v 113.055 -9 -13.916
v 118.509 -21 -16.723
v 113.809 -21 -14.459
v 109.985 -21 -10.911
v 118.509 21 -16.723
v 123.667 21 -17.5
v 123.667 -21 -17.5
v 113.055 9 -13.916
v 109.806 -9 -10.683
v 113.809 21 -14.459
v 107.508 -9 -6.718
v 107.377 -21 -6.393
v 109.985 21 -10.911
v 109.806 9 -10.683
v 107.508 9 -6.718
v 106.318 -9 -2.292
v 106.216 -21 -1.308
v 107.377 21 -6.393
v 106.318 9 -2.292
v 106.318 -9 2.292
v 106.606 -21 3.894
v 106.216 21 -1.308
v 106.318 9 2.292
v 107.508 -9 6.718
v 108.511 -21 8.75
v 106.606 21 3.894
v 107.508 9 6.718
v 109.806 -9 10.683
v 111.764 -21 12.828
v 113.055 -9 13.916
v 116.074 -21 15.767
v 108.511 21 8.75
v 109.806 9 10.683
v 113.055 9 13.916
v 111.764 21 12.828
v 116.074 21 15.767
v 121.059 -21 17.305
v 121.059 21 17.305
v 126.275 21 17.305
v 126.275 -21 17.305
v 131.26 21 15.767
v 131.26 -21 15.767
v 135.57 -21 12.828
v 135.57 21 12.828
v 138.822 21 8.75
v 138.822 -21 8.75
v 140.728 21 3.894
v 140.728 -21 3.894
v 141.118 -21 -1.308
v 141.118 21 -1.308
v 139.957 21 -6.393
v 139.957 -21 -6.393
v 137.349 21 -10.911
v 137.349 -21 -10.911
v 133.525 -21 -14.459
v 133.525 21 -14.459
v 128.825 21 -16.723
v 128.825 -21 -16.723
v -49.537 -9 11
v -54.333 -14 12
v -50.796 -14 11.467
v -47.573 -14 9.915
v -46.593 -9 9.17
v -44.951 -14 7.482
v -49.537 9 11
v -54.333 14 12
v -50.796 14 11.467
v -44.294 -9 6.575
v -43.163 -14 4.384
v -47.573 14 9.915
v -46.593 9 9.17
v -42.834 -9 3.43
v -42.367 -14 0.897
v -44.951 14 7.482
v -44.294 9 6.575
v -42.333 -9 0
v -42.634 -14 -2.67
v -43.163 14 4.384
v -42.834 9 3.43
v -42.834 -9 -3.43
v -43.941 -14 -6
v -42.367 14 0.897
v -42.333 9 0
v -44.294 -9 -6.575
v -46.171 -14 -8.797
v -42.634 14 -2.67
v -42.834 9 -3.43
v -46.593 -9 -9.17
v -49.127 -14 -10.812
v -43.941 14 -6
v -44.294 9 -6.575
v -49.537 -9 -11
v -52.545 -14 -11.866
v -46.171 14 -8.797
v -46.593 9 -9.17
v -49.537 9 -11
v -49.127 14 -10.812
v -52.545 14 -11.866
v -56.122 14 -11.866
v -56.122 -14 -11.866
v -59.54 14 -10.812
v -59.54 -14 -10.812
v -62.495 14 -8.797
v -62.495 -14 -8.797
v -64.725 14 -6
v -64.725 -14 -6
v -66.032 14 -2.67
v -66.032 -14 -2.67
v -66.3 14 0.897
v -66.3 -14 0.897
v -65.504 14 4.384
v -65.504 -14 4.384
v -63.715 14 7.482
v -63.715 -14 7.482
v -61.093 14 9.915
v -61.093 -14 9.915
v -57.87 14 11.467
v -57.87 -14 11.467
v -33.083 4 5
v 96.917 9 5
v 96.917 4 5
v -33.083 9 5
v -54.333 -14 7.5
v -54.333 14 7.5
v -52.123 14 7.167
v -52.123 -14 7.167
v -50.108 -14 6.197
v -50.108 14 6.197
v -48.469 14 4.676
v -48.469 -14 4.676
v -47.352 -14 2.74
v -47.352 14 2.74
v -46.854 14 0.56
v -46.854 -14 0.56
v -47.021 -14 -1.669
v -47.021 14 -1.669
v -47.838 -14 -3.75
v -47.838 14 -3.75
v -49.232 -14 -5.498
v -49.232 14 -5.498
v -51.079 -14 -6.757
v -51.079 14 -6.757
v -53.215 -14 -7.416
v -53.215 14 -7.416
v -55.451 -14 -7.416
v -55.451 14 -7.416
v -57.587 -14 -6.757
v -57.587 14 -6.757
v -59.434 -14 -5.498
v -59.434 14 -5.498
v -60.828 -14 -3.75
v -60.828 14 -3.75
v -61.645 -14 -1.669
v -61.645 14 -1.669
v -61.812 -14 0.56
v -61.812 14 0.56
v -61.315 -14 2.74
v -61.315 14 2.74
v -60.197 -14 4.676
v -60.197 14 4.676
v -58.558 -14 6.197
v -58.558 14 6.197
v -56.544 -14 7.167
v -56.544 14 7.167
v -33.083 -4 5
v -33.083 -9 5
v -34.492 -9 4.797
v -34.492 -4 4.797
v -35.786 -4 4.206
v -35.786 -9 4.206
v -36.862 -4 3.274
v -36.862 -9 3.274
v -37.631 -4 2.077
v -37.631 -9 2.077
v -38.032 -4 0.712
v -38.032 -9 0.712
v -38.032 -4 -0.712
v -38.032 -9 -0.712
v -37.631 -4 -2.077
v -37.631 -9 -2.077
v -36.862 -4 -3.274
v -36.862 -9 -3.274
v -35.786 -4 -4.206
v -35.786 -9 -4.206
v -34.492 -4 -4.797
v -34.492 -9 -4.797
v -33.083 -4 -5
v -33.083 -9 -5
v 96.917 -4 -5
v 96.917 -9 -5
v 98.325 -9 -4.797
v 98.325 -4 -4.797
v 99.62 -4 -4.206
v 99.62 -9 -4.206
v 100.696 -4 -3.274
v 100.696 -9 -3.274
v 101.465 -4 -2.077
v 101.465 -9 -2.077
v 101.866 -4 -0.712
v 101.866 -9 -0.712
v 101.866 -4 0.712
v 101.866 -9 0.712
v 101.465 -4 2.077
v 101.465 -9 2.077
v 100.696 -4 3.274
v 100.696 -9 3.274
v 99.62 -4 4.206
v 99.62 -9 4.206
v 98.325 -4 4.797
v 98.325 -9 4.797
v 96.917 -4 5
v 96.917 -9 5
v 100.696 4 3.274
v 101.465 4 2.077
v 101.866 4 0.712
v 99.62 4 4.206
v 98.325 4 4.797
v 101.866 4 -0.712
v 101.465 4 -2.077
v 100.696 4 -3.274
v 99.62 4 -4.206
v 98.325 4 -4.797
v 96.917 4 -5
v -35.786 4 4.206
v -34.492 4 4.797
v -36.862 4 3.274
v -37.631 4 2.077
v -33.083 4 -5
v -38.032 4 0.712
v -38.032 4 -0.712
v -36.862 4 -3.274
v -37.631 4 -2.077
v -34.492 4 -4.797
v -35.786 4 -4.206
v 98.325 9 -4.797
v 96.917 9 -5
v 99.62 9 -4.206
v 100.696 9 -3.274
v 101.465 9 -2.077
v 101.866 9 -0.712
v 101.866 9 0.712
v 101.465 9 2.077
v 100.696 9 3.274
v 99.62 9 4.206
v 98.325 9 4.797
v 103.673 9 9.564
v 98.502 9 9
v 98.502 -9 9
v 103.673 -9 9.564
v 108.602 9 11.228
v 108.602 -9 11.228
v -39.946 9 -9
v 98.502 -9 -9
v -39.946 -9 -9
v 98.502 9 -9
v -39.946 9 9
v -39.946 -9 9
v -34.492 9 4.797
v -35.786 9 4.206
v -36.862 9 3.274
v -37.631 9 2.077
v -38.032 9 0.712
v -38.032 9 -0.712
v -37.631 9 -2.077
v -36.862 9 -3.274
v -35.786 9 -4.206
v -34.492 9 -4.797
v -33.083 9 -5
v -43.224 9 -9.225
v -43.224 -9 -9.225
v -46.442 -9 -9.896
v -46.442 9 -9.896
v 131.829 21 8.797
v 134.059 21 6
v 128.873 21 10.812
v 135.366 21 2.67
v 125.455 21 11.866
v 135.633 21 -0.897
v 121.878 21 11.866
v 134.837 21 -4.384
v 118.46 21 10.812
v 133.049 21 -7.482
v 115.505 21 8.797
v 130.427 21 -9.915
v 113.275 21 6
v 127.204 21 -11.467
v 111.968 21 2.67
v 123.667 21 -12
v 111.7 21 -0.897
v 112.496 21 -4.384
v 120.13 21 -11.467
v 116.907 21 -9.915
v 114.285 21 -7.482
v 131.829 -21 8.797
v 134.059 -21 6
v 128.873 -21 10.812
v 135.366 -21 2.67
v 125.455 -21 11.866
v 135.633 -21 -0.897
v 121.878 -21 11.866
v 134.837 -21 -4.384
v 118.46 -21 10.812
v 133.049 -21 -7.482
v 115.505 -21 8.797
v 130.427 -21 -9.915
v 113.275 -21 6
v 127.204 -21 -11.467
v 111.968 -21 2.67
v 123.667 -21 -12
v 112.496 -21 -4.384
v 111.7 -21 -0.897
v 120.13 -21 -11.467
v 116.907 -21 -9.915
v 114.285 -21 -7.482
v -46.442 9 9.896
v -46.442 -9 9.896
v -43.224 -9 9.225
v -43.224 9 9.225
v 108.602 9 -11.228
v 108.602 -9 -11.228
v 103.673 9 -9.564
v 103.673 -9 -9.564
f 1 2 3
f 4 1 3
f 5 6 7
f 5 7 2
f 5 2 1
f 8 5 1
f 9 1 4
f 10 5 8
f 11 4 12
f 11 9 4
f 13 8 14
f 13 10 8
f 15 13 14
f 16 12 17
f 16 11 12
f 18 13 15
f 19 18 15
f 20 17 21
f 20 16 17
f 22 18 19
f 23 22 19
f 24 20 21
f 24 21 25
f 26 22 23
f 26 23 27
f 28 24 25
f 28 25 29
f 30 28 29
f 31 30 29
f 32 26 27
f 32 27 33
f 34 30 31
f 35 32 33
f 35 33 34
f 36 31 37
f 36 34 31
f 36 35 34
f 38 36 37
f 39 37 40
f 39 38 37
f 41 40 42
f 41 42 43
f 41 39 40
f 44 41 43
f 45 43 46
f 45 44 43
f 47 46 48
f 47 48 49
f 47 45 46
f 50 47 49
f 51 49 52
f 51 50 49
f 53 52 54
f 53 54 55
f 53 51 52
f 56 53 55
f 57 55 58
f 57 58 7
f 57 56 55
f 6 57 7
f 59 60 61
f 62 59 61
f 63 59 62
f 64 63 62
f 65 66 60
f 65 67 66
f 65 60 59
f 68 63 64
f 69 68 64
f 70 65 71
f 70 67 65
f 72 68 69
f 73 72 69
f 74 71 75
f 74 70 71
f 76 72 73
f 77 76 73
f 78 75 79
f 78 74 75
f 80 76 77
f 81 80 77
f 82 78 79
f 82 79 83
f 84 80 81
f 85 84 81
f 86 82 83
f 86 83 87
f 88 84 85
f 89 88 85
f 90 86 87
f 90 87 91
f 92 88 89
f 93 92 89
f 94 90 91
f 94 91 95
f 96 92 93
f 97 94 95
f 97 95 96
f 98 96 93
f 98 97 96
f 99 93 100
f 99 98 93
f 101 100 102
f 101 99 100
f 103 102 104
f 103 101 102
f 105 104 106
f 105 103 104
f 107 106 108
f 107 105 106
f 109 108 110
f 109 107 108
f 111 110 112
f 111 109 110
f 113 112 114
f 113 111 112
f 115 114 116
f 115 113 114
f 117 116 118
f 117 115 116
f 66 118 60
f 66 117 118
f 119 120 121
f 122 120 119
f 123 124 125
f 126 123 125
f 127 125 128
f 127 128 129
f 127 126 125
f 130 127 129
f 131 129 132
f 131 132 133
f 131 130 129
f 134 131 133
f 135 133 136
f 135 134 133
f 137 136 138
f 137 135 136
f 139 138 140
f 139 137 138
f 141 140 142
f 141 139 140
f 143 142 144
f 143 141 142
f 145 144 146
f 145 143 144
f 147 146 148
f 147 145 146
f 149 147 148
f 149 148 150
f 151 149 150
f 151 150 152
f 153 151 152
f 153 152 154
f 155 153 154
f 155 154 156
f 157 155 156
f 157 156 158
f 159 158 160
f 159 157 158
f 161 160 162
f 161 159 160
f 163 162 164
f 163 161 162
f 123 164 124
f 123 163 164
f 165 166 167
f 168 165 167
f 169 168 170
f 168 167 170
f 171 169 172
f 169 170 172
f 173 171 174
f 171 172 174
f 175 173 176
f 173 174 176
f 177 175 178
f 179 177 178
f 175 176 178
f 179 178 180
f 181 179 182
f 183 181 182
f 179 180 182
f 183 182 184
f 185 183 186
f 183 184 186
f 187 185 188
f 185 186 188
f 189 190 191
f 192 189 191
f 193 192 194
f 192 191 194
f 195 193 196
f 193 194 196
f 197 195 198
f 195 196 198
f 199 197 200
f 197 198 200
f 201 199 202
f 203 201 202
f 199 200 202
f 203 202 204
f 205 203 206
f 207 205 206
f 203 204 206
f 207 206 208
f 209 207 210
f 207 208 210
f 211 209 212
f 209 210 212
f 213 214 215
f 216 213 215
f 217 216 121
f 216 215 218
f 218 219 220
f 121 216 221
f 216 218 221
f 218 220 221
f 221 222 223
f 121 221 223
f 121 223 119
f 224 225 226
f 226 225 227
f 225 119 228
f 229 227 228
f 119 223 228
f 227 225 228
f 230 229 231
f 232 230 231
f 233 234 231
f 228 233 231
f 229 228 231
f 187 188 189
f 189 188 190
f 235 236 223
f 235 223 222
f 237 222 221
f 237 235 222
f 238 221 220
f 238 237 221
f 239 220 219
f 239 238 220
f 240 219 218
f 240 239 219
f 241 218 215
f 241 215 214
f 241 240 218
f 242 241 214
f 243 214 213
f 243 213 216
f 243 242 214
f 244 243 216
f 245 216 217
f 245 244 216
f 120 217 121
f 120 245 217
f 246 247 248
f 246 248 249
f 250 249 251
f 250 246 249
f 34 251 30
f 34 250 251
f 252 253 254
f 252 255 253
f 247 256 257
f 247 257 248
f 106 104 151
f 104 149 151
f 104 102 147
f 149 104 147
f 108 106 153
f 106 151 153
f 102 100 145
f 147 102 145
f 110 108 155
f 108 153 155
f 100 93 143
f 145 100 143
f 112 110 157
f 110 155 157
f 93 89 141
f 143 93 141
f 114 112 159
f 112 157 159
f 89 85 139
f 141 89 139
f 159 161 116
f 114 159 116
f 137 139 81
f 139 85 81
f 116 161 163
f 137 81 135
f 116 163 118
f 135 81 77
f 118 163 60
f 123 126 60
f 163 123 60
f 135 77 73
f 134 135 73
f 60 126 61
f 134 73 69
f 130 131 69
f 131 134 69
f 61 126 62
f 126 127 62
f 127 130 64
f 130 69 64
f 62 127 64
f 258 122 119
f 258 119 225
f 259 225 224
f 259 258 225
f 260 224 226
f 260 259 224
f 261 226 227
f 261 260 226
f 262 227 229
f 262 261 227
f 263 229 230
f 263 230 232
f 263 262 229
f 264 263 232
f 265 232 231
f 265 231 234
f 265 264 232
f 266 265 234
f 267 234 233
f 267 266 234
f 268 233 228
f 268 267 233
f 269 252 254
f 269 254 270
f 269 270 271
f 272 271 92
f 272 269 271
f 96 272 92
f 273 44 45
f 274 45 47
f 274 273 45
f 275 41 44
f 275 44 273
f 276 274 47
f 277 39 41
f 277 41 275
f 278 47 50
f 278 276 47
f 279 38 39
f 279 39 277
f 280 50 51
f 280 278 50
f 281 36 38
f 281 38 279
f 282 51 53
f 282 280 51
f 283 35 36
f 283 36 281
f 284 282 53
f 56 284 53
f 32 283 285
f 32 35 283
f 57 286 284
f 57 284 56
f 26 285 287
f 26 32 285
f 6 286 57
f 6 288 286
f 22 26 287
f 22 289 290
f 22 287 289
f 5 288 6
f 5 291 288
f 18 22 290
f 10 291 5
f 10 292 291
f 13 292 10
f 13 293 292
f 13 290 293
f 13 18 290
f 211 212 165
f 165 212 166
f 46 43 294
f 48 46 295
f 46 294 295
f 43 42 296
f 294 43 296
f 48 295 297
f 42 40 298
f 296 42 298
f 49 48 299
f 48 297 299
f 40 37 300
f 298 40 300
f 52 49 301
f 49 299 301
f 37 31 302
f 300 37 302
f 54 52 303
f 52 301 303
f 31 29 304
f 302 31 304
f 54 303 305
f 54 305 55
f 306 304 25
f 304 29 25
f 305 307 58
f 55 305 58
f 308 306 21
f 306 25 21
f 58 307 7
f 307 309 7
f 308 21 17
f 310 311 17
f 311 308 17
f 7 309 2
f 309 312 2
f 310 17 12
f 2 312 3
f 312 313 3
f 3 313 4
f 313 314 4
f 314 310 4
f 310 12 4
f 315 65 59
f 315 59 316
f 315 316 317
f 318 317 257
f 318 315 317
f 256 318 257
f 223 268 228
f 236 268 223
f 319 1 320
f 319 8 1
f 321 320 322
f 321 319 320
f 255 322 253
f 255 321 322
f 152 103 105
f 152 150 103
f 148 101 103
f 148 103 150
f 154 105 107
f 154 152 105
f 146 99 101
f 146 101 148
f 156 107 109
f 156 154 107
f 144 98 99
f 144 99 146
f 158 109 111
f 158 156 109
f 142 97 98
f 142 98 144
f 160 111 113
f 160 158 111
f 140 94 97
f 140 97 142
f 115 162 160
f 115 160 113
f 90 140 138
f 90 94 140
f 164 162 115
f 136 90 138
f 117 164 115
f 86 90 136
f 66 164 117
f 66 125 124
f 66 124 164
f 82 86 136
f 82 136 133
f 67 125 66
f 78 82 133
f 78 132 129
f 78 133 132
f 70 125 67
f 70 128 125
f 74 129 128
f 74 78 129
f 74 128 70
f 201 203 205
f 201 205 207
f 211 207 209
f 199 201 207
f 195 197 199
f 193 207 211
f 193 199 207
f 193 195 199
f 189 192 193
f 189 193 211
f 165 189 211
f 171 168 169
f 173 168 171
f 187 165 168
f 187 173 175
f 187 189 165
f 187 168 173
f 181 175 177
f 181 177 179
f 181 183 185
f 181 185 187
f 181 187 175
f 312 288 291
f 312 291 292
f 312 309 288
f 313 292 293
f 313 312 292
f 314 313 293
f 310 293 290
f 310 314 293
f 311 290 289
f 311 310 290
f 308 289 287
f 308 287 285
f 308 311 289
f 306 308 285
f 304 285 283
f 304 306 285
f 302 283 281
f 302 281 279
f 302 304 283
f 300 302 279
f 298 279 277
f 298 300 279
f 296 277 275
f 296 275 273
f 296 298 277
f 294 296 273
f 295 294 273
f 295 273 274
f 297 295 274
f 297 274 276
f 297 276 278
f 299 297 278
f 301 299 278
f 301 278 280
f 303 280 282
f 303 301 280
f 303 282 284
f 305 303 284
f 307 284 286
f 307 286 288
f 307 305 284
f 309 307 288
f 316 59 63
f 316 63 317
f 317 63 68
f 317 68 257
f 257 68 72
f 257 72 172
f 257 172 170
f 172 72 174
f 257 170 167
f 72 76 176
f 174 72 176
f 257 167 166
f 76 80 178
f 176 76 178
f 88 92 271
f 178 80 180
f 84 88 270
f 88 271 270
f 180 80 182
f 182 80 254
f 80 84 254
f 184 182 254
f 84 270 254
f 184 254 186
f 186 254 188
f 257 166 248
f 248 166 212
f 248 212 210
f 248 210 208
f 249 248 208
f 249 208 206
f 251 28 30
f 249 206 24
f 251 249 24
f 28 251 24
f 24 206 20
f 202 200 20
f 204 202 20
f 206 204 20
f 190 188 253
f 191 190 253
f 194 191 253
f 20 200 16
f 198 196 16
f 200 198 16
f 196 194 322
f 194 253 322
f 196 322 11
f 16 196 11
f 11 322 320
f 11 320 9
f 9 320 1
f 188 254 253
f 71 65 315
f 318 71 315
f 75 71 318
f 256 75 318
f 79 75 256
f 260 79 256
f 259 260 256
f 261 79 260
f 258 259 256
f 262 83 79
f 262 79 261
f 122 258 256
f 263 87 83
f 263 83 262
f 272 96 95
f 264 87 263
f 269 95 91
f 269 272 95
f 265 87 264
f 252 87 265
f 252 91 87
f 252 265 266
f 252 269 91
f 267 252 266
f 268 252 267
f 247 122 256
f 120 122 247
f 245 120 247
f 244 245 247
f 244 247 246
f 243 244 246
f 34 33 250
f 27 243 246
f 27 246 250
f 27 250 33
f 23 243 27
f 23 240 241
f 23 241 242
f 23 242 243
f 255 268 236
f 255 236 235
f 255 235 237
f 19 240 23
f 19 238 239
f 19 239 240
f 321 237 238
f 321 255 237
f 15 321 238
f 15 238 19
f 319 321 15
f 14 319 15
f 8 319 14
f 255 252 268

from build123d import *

# Parameters (mm, degrees)
SKETCH1_R           = 7.5
BOSS_EXTRUDE1_DEPTH = 14
SKETCH1_3_R         = 12
BOSS_EXTRUDE2_DEPTH = 21
BOSS_EXTRUDE3_DEPTH = 9
CUT_EXTRUDE1_START  = 9
CUT_EXTRUDE1_DEPTH  = 5


with BuildPart() as part:
    # Sketch1 → Boss-Extrude1 (new, symmetric)
    with BuildSketch(Plane(origin=(0, 0, 0), x_dir=(1, 0, 0), z_dir=(0, 1, 0))):
        with BuildLine():
            ThreePointArc((-42.333170882, 0), (-44.294496212, 6.574573055), (-49.537339359, 11))
            ThreePointArc((-49.537339359, 11), (-66.333170882, 0), (-49.537339359, -11))
            ThreePointArc((-49.537339359, -11), (-44.294496212, -6.574573055), (-42.333170882, 0))
        make_face()
        with Locations((-54.333170882, 0)):
            Circle(SKETCH1_R, mode=Mode.SUBTRACT)
    extrude(amount=BOSS_EXTRUDE1_DEPTH, both=True)



with BuildPart() as body_2:
    # Sketch1<3> → Boss-Extrude2 (new, symmetric)
    with BuildSketch(Plane(origin=(0, 0, 0), x_dir=(1, 0, 0), z_dir=(0, 1, 0))):
        with BuildLine():
            ThreePointArc((141.166829118, 0), (131.430475798, 15.683615343), (113.055310235, 13.915662651))
            ThreePointArc((113.055310235, 13.915662651), (106.166829118, 0), (113.055310235, -13.915662651))
            ThreePointArc((113.055310235, -13.915662651), (131.430475798, -15.683615343), (141.166829118, 0))
        make_face()
        with Locations((123.666829118, 0)):
            Circle(SKETCH1_3_R, mode=Mode.SUBTRACT)
    extrude(amount=BOSS_EXTRUDE2_DEPTH, both=True)


with BuildPart() as part_1:
    add(part.part)

    add(body_2.part)  # Boss-Extrude3 merges body 2
    # Sketch1<4> → Boss-Extrude3 (add, symmetric)
    with BuildSketch(Plane(origin=(0, 0, 0), x_dir=(1, 0, 0), z_dir=(0, 1, 0))):
        with BuildLine():
            Line((98.502370054, 9), (-39.945676312, 9))
            ThreePointArc((-39.945676312, 9), (-44.844655798, 9.505319751), (-49.537339359, 11))
            ThreePointArc((-49.537339359, 11), (-42.333170882, 0), (-49.537339359, -11))
            ThreePointArc((-49.537339359, -11), (-44.844655798, -9.505319751), (-39.945676312, -9))
            Line((-39.945676312, -9), (98.502370054, -9))
            ThreePointArc((98.502370054, -9), (106.182731491, -10.26210106), (113.055310235, -13.915662651))
            ThreePointArc((113.055310235, -13.915662651), (106.166829118, 0), (113.055310235, 13.915662651))
            ThreePointArc((113.055310235, 13.915662651), (106.182731491, 10.26210106), (98.502370054, 9))
        make_face()
    extrude(amount=BOSS_EXTRUDE3_DEPTH, both=True)

    # Sketch1<5> → Cut-Extrude1 (cut)
    with BuildSketch(Plane(origin=(0, 0, 0), x_dir=(1, 0, 0), z_dir=(0, 1, 0)).offset(CUT_EXTRUDE1_START)):
        with BuildLine():
            Line((-33.083170882, 5), (96.916829118, 5))
            ThreePointArc((96.916829118, 5), (101.916829118, 0), (96.916829118, -5))
            Line((96.916829118, -5), (-33.083170882, -5))
            ThreePointArc((-33.083170882, -5), (-38.083170882, 0), (-33.083170882, 5))
        make_face()
    cut_extrude1 = extrude(amount=-CUT_EXTRUDE1_DEPTH, mode=Mode.SUBTRACT)

    # Mirror1: Cut-Extrude1 across plane
    add(cut_extrude1.mirror(Plane.ZX), mode=Mode.SUBTRACT)


solid = part_1.part
